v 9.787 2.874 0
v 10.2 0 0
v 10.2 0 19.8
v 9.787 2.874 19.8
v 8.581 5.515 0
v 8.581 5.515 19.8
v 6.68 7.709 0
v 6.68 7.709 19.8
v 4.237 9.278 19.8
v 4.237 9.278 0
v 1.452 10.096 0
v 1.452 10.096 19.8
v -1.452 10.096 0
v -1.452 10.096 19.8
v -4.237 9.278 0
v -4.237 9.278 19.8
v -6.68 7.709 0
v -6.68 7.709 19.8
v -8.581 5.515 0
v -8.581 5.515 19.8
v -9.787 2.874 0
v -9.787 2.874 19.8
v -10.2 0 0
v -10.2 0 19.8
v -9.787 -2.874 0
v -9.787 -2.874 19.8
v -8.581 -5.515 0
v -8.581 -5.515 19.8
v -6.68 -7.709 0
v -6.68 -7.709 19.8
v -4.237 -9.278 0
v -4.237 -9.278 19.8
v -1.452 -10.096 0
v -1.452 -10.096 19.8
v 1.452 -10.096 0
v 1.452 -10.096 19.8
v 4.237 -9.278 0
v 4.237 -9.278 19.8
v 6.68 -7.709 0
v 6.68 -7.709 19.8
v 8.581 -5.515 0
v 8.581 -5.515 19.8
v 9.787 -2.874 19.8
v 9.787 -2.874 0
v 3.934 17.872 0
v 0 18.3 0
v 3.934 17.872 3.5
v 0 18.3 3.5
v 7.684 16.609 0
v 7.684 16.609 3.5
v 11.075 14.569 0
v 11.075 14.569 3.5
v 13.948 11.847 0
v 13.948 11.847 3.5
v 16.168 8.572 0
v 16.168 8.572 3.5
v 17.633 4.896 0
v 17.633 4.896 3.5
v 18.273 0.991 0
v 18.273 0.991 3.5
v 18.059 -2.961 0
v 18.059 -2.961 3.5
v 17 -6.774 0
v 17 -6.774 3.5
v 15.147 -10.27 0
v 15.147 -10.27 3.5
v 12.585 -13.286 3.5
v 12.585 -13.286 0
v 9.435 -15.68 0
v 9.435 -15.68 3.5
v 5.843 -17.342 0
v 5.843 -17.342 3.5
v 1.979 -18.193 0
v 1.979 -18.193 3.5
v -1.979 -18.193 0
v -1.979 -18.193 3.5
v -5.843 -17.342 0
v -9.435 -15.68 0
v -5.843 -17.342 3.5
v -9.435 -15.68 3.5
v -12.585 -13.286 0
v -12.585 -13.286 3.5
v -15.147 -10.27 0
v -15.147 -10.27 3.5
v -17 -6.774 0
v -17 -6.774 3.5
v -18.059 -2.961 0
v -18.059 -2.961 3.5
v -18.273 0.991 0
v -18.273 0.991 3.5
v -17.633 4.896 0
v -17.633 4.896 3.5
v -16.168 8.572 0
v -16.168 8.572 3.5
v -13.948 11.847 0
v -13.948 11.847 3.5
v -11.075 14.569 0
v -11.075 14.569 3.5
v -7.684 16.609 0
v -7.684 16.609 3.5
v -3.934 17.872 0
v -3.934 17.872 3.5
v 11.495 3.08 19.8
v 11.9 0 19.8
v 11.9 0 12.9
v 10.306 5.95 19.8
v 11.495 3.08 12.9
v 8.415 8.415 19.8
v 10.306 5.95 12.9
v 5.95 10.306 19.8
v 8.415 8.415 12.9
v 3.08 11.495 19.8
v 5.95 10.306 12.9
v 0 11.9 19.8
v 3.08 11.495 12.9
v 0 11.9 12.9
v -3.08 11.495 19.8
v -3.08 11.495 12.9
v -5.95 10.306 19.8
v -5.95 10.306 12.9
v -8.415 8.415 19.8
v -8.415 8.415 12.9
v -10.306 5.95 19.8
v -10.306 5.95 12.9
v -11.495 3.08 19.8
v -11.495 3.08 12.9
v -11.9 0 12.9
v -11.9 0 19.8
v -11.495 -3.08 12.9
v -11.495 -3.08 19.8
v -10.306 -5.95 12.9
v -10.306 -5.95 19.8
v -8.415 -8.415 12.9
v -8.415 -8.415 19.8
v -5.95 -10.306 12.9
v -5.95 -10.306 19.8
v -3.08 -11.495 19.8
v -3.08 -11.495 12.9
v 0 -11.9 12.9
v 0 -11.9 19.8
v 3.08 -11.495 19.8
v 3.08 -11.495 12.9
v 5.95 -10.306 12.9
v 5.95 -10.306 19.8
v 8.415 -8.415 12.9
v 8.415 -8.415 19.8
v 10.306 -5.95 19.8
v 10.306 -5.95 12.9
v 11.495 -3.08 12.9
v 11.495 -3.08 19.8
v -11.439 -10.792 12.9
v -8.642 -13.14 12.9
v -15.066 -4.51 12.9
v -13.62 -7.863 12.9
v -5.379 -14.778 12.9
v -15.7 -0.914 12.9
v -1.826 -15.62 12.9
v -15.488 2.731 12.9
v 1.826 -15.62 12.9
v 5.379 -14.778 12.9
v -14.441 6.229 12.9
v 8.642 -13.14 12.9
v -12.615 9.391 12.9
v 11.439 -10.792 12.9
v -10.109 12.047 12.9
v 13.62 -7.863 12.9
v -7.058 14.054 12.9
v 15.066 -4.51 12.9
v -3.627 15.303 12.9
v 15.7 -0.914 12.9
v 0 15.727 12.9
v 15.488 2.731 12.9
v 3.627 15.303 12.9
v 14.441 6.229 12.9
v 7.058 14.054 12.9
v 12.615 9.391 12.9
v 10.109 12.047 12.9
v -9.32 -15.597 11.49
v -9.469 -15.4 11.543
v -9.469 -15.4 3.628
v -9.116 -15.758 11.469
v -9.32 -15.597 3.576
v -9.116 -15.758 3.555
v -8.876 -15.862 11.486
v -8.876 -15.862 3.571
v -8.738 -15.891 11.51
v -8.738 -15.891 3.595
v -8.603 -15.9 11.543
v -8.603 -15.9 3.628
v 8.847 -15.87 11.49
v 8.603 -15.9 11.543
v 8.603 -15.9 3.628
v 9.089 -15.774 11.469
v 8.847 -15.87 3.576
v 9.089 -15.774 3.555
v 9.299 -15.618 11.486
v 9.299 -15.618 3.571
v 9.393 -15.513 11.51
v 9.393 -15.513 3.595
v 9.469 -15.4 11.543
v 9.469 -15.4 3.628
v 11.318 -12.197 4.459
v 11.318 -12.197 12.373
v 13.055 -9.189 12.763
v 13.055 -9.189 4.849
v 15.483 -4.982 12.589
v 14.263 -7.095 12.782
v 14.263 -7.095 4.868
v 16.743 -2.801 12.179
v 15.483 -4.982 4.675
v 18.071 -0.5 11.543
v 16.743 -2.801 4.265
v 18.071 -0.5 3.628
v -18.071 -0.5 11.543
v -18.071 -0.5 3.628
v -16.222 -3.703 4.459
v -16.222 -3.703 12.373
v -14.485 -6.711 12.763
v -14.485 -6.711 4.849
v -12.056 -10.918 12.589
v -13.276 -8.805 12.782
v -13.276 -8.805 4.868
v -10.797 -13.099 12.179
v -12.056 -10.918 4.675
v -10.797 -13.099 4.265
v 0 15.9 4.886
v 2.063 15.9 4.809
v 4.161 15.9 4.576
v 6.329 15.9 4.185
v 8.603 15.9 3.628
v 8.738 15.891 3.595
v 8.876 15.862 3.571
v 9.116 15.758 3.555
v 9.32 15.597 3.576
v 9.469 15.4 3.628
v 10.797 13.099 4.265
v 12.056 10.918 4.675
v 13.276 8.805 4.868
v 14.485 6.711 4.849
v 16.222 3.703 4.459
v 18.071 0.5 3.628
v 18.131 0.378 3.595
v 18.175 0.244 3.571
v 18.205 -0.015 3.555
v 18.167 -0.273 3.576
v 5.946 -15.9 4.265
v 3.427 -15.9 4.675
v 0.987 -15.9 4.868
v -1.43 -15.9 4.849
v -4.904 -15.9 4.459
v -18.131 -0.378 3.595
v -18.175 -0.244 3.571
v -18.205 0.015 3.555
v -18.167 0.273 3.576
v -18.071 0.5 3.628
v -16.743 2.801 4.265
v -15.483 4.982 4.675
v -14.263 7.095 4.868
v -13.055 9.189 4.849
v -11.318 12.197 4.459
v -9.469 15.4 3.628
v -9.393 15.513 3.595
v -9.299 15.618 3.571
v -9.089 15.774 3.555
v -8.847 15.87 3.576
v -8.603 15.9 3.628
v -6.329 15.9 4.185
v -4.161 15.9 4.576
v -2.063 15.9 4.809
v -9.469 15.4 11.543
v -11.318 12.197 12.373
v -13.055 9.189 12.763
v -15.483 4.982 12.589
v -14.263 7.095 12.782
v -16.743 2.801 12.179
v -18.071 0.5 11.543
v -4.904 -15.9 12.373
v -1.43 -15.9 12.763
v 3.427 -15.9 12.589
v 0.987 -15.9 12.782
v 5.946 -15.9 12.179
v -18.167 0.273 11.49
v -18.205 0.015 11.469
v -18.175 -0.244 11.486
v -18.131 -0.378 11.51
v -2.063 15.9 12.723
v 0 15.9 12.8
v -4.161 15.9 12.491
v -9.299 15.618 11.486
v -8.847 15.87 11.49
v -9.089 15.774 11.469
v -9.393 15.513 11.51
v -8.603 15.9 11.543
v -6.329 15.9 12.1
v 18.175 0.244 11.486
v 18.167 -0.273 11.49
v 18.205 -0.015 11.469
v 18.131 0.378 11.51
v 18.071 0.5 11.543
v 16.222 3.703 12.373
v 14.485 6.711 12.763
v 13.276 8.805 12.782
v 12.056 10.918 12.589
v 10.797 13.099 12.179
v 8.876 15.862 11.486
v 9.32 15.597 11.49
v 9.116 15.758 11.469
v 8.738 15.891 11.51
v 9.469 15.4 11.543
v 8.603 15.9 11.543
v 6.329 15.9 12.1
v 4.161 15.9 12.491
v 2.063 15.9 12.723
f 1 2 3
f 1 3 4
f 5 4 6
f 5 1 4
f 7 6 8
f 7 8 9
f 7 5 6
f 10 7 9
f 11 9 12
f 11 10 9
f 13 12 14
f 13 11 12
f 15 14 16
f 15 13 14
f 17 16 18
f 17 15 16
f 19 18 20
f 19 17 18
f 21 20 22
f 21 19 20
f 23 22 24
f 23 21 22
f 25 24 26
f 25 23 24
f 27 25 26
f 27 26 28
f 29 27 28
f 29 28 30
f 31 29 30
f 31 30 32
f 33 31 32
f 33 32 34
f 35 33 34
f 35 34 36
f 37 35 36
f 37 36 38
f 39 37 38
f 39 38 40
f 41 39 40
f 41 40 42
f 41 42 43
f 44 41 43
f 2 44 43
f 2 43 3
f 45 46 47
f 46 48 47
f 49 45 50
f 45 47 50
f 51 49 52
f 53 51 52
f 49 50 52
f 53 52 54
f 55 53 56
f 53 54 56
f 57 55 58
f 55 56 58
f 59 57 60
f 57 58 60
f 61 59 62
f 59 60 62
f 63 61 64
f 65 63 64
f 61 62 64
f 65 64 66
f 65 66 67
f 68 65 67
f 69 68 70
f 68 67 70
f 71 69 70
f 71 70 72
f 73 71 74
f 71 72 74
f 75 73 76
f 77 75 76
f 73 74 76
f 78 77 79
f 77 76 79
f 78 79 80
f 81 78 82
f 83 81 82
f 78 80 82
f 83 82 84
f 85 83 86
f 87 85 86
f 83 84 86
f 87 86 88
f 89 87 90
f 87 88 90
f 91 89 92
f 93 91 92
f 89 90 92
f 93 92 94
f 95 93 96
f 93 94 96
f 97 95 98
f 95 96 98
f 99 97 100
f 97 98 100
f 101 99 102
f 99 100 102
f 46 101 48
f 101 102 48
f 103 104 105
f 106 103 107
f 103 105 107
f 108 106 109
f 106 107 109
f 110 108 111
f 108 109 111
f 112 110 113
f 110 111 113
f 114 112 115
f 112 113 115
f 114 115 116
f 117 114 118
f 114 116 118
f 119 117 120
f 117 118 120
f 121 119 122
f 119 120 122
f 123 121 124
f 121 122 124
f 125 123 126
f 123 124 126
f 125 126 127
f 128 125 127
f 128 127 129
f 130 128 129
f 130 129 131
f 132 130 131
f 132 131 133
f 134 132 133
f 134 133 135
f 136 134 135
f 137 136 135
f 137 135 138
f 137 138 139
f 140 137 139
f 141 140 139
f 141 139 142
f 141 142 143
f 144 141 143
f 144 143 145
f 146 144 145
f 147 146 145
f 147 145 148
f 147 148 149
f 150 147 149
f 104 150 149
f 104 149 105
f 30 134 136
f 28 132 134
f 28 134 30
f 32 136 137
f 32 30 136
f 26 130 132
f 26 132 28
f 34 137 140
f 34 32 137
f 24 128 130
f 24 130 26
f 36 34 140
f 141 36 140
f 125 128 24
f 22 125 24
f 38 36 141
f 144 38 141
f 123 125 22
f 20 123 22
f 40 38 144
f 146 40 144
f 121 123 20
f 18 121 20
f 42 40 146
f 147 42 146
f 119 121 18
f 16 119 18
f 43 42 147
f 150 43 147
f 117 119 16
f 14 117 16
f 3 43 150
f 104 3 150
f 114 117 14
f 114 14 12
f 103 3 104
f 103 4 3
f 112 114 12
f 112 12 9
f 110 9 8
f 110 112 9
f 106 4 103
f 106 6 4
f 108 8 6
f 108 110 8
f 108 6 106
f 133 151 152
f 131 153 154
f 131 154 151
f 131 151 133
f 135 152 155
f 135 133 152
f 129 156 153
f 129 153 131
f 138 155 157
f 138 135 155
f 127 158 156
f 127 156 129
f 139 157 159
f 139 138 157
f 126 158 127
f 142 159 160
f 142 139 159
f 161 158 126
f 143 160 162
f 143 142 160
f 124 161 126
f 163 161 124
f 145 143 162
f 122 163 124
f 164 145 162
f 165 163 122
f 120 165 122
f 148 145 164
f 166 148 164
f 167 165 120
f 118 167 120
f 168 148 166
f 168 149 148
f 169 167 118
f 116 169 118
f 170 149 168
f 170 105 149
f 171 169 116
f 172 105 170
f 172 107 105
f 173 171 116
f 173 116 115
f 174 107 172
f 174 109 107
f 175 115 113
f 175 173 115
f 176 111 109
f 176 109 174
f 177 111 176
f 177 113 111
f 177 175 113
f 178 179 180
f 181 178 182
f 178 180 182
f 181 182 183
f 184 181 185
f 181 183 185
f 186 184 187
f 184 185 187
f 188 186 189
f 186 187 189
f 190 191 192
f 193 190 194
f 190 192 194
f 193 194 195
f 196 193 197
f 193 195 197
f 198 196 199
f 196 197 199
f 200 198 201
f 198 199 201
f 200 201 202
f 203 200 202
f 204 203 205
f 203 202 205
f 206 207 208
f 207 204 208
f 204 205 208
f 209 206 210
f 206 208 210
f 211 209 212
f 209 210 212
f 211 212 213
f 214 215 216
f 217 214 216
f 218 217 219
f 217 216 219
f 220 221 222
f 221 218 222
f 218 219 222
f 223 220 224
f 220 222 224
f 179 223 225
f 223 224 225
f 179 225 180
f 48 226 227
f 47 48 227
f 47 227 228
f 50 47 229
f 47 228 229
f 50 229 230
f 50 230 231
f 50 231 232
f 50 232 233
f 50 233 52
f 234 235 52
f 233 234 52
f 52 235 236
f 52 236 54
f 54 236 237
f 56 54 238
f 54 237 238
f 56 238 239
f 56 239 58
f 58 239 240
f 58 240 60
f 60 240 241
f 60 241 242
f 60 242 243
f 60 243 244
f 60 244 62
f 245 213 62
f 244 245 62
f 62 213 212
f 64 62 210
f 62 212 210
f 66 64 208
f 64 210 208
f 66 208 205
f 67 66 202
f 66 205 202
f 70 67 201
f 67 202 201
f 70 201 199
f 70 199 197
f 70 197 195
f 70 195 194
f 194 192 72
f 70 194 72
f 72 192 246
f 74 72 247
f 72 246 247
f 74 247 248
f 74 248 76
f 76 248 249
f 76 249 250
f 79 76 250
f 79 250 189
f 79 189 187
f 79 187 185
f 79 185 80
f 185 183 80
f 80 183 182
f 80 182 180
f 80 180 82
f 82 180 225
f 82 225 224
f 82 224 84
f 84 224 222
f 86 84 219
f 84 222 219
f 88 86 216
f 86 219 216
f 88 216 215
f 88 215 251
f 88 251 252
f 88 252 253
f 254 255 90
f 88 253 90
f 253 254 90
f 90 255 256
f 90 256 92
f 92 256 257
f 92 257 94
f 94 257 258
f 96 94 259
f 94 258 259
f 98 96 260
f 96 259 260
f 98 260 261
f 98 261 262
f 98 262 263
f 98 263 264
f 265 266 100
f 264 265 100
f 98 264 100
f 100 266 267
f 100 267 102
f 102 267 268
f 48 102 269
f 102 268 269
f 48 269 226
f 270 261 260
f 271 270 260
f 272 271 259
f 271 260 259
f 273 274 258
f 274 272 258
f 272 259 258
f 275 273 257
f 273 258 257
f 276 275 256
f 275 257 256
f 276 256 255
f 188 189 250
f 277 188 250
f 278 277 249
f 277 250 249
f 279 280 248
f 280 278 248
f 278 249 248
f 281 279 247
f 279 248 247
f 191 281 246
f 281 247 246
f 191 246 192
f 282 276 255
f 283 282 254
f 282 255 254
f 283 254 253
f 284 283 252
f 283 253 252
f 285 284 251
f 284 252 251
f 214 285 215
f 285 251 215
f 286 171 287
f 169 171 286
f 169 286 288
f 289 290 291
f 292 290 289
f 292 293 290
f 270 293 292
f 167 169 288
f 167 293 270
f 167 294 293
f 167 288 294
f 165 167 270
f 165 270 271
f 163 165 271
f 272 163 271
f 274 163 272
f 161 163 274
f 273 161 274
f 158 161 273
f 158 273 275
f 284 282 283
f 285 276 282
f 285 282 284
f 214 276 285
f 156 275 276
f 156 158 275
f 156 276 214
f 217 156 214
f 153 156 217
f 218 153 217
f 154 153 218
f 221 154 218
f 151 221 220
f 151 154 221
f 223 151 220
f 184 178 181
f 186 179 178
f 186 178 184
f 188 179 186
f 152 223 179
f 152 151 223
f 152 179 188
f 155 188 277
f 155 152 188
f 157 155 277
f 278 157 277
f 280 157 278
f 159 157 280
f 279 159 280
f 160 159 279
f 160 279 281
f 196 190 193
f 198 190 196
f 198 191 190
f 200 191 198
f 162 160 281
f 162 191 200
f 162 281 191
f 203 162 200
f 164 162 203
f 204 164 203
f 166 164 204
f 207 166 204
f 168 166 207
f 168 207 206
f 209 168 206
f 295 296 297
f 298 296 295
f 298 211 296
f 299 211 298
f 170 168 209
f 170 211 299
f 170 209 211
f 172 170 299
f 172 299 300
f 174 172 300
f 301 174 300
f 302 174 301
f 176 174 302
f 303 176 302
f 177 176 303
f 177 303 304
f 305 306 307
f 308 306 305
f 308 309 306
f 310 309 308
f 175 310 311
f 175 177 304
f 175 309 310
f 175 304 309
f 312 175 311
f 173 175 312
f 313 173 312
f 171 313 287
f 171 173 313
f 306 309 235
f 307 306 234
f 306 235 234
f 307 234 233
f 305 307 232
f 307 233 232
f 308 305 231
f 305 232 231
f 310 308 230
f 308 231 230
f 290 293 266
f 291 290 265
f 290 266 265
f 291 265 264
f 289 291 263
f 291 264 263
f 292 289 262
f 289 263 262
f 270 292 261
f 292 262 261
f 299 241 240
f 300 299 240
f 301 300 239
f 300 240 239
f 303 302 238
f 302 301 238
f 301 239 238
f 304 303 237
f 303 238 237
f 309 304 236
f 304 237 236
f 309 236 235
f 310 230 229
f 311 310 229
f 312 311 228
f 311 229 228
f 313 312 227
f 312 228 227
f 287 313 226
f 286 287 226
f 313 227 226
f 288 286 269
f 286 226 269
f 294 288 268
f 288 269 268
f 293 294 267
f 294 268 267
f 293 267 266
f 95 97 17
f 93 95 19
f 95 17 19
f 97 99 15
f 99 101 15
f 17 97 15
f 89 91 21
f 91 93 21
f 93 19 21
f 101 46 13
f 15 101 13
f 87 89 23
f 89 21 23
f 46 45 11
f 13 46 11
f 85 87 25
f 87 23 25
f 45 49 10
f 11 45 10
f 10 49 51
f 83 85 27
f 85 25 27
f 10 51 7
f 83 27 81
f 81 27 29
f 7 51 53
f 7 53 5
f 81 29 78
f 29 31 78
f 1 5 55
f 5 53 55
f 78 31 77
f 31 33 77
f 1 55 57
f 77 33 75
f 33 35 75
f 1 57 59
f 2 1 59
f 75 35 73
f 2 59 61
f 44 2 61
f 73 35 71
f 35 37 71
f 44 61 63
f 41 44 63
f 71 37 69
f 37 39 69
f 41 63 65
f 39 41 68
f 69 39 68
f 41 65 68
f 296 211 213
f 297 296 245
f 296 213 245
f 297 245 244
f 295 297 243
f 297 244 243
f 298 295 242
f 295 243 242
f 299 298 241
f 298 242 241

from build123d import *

# Parameters (mm, degrees)
SKETCH2_R           = 10.2
BOSS_EXTRUDE1_DEPTH = 12.9
SKETCH4_R           = 11.9
SKETCH4_R_2         = 10.2
BOSS_EXTRUDE2_DEPTH = 19.8


with BuildPart() as part:
    # Sketch1 → Revolve1 (revolve)
    with BuildSketch(Plane(origin=(0, 0, 0), x_dir=(0, 0, -1), z_dir=(1, 0, 0))):
        Polygon((0, 10.2), (0, 18.3), (-3.5, 18.3), (-8.17653718, 10.2), align=None)
    revolve(axis=Axis((0, 0, 27.758529938), (0, 0, -1)))

    # Sketch2 → Boss-Extrude1 (add)
    with BuildSketch(Plane.XY):
        with BuildLine():
            Line((18.071063426, 0.5), (9.468544415, 15.4))
            ThreePointArc((9.468544415, 15.4), (9.102519011, 15.766025404), (8.602519011, 15.9))
            Line((8.602519011, 15.9), (-8.602519011, 15.9))
            ThreePointArc((-8.602519011, 15.9), (-9.102519011, 15.766025404), (-9.468544415, 15.4))
            Line((-9.468544415, 15.4), (-18.071063426, 0.5))
            ThreePointArc((-18.071063426, 0.5), (-18.205038022, 0), (-18.071063426, -0.5))
            Line((-18.071063426, -0.5), (-9.468544415, -15.4))
            ThreePointArc((-9.468544415, -15.4), (-9.102519011, -15.766025404), (-8.602519011, -15.9))
            Line((-8.602519011, -15.9), (8.602519011, -15.9))
            ThreePointArc((8.602519011, -15.9), (9.102519011, -15.766025404), (9.468544415, -15.4))
            Line((9.468544415, -15.4), (18.071063426, -0.5))
            ThreePointArc((18.071063426, -0.5), (18.205038022, 0), (18.071063426, 0.5))
        make_face()
        Circle(SKETCH2_R, mode=Mode.SUBTRACT)
    extrude(amount=BOSS_EXTRUDE1_DEPTH)

    # Sketch3 → Cut-Revolve2 (revolve, cut)
    with BuildSketch(Plane(origin=(0, 0, 0), x_dir=(0, 0, -1), z_dir=(1, 0, 0))):
        Polygon((-11.414359354, 18.3), (-21.97986928, 0), (-22.588162692, 0), (-22.588162692, 18.3), align=None)
    revolve(axis=Axis((0, 0, 0), (0, 0, 1)), mode=Mode.SUBTRACT)

    # Sketch4 → Boss-Extrude2 (add)
    with BuildSketch(Plane.XY):
        Circle(SKETCH4_R)
        Circle(SKETCH4_R_2, mode=Mode.SUBTRACT)
    extrude(amount=BOSS_EXTRUDE2_DEPTH)


solid = part.part
